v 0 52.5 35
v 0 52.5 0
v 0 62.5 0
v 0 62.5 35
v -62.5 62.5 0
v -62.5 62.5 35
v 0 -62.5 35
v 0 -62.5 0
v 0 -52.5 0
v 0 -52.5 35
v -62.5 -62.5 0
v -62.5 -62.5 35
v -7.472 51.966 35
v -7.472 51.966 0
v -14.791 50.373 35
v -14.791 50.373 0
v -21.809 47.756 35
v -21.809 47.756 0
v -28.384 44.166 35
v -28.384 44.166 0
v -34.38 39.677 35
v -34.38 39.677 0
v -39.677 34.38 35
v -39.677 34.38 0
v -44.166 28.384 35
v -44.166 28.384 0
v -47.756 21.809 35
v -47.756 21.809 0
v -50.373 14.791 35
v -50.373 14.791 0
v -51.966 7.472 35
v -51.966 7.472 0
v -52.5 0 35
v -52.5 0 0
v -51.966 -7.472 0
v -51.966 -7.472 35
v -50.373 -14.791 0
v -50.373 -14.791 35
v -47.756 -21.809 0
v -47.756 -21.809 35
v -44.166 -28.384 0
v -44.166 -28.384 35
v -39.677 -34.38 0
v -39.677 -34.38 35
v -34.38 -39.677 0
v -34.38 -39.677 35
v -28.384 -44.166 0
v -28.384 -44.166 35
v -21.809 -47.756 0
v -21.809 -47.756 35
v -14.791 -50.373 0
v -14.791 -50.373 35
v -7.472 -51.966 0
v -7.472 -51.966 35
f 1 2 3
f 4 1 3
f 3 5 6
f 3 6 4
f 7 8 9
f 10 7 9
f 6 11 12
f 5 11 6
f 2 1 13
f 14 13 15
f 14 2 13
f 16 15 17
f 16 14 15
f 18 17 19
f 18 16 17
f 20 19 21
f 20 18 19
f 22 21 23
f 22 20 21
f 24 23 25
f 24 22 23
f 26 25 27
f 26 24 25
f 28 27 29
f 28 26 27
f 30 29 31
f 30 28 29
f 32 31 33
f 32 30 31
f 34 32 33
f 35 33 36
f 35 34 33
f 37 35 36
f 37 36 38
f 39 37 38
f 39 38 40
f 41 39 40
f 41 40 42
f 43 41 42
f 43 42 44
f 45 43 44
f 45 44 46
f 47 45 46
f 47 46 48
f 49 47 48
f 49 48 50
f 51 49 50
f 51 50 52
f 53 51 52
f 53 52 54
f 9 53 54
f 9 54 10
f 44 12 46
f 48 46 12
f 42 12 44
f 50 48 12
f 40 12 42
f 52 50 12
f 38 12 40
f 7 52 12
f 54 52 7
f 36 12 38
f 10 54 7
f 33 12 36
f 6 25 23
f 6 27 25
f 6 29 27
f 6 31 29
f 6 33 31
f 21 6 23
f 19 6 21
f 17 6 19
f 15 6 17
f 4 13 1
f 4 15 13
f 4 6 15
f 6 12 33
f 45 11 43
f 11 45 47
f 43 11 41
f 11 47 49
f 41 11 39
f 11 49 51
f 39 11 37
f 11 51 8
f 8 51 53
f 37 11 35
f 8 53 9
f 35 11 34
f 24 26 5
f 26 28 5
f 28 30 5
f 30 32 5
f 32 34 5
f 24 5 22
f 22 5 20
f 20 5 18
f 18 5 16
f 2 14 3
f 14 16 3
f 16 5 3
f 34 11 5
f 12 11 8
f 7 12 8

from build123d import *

# Parameters (mm, degrees)
SKETCH_W     = 125
SKETCH_H     = 125
SKETCH_R     = 52.5
PAD_DEPTH    = 35
SKETCH001_W  = 131.958801
SKETCH001_H  = 149.735626
POCKET_DEPTH = 35.001


with BuildPart() as part:
    # Sketch → Pad (new body)
    with BuildSketch(Plane.XY):
        Rectangle(SKETCH_W, SKETCH_H)
        Circle(SKETCH_R, mode=Mode.SUBTRACT)
    extrude(amount=PAD_DEPTH)

    # Sketch001 → Pocket (cut, through all)
    with BuildSketch(Plane.XY):
        with Locations((65.9794, -4.983963)):
            Rectangle(SKETCH001_W, SKETCH001_H)
    extrude(amount=POCKET_DEPTH, mode=Mode.SUBTRACT)


solid = part.part
